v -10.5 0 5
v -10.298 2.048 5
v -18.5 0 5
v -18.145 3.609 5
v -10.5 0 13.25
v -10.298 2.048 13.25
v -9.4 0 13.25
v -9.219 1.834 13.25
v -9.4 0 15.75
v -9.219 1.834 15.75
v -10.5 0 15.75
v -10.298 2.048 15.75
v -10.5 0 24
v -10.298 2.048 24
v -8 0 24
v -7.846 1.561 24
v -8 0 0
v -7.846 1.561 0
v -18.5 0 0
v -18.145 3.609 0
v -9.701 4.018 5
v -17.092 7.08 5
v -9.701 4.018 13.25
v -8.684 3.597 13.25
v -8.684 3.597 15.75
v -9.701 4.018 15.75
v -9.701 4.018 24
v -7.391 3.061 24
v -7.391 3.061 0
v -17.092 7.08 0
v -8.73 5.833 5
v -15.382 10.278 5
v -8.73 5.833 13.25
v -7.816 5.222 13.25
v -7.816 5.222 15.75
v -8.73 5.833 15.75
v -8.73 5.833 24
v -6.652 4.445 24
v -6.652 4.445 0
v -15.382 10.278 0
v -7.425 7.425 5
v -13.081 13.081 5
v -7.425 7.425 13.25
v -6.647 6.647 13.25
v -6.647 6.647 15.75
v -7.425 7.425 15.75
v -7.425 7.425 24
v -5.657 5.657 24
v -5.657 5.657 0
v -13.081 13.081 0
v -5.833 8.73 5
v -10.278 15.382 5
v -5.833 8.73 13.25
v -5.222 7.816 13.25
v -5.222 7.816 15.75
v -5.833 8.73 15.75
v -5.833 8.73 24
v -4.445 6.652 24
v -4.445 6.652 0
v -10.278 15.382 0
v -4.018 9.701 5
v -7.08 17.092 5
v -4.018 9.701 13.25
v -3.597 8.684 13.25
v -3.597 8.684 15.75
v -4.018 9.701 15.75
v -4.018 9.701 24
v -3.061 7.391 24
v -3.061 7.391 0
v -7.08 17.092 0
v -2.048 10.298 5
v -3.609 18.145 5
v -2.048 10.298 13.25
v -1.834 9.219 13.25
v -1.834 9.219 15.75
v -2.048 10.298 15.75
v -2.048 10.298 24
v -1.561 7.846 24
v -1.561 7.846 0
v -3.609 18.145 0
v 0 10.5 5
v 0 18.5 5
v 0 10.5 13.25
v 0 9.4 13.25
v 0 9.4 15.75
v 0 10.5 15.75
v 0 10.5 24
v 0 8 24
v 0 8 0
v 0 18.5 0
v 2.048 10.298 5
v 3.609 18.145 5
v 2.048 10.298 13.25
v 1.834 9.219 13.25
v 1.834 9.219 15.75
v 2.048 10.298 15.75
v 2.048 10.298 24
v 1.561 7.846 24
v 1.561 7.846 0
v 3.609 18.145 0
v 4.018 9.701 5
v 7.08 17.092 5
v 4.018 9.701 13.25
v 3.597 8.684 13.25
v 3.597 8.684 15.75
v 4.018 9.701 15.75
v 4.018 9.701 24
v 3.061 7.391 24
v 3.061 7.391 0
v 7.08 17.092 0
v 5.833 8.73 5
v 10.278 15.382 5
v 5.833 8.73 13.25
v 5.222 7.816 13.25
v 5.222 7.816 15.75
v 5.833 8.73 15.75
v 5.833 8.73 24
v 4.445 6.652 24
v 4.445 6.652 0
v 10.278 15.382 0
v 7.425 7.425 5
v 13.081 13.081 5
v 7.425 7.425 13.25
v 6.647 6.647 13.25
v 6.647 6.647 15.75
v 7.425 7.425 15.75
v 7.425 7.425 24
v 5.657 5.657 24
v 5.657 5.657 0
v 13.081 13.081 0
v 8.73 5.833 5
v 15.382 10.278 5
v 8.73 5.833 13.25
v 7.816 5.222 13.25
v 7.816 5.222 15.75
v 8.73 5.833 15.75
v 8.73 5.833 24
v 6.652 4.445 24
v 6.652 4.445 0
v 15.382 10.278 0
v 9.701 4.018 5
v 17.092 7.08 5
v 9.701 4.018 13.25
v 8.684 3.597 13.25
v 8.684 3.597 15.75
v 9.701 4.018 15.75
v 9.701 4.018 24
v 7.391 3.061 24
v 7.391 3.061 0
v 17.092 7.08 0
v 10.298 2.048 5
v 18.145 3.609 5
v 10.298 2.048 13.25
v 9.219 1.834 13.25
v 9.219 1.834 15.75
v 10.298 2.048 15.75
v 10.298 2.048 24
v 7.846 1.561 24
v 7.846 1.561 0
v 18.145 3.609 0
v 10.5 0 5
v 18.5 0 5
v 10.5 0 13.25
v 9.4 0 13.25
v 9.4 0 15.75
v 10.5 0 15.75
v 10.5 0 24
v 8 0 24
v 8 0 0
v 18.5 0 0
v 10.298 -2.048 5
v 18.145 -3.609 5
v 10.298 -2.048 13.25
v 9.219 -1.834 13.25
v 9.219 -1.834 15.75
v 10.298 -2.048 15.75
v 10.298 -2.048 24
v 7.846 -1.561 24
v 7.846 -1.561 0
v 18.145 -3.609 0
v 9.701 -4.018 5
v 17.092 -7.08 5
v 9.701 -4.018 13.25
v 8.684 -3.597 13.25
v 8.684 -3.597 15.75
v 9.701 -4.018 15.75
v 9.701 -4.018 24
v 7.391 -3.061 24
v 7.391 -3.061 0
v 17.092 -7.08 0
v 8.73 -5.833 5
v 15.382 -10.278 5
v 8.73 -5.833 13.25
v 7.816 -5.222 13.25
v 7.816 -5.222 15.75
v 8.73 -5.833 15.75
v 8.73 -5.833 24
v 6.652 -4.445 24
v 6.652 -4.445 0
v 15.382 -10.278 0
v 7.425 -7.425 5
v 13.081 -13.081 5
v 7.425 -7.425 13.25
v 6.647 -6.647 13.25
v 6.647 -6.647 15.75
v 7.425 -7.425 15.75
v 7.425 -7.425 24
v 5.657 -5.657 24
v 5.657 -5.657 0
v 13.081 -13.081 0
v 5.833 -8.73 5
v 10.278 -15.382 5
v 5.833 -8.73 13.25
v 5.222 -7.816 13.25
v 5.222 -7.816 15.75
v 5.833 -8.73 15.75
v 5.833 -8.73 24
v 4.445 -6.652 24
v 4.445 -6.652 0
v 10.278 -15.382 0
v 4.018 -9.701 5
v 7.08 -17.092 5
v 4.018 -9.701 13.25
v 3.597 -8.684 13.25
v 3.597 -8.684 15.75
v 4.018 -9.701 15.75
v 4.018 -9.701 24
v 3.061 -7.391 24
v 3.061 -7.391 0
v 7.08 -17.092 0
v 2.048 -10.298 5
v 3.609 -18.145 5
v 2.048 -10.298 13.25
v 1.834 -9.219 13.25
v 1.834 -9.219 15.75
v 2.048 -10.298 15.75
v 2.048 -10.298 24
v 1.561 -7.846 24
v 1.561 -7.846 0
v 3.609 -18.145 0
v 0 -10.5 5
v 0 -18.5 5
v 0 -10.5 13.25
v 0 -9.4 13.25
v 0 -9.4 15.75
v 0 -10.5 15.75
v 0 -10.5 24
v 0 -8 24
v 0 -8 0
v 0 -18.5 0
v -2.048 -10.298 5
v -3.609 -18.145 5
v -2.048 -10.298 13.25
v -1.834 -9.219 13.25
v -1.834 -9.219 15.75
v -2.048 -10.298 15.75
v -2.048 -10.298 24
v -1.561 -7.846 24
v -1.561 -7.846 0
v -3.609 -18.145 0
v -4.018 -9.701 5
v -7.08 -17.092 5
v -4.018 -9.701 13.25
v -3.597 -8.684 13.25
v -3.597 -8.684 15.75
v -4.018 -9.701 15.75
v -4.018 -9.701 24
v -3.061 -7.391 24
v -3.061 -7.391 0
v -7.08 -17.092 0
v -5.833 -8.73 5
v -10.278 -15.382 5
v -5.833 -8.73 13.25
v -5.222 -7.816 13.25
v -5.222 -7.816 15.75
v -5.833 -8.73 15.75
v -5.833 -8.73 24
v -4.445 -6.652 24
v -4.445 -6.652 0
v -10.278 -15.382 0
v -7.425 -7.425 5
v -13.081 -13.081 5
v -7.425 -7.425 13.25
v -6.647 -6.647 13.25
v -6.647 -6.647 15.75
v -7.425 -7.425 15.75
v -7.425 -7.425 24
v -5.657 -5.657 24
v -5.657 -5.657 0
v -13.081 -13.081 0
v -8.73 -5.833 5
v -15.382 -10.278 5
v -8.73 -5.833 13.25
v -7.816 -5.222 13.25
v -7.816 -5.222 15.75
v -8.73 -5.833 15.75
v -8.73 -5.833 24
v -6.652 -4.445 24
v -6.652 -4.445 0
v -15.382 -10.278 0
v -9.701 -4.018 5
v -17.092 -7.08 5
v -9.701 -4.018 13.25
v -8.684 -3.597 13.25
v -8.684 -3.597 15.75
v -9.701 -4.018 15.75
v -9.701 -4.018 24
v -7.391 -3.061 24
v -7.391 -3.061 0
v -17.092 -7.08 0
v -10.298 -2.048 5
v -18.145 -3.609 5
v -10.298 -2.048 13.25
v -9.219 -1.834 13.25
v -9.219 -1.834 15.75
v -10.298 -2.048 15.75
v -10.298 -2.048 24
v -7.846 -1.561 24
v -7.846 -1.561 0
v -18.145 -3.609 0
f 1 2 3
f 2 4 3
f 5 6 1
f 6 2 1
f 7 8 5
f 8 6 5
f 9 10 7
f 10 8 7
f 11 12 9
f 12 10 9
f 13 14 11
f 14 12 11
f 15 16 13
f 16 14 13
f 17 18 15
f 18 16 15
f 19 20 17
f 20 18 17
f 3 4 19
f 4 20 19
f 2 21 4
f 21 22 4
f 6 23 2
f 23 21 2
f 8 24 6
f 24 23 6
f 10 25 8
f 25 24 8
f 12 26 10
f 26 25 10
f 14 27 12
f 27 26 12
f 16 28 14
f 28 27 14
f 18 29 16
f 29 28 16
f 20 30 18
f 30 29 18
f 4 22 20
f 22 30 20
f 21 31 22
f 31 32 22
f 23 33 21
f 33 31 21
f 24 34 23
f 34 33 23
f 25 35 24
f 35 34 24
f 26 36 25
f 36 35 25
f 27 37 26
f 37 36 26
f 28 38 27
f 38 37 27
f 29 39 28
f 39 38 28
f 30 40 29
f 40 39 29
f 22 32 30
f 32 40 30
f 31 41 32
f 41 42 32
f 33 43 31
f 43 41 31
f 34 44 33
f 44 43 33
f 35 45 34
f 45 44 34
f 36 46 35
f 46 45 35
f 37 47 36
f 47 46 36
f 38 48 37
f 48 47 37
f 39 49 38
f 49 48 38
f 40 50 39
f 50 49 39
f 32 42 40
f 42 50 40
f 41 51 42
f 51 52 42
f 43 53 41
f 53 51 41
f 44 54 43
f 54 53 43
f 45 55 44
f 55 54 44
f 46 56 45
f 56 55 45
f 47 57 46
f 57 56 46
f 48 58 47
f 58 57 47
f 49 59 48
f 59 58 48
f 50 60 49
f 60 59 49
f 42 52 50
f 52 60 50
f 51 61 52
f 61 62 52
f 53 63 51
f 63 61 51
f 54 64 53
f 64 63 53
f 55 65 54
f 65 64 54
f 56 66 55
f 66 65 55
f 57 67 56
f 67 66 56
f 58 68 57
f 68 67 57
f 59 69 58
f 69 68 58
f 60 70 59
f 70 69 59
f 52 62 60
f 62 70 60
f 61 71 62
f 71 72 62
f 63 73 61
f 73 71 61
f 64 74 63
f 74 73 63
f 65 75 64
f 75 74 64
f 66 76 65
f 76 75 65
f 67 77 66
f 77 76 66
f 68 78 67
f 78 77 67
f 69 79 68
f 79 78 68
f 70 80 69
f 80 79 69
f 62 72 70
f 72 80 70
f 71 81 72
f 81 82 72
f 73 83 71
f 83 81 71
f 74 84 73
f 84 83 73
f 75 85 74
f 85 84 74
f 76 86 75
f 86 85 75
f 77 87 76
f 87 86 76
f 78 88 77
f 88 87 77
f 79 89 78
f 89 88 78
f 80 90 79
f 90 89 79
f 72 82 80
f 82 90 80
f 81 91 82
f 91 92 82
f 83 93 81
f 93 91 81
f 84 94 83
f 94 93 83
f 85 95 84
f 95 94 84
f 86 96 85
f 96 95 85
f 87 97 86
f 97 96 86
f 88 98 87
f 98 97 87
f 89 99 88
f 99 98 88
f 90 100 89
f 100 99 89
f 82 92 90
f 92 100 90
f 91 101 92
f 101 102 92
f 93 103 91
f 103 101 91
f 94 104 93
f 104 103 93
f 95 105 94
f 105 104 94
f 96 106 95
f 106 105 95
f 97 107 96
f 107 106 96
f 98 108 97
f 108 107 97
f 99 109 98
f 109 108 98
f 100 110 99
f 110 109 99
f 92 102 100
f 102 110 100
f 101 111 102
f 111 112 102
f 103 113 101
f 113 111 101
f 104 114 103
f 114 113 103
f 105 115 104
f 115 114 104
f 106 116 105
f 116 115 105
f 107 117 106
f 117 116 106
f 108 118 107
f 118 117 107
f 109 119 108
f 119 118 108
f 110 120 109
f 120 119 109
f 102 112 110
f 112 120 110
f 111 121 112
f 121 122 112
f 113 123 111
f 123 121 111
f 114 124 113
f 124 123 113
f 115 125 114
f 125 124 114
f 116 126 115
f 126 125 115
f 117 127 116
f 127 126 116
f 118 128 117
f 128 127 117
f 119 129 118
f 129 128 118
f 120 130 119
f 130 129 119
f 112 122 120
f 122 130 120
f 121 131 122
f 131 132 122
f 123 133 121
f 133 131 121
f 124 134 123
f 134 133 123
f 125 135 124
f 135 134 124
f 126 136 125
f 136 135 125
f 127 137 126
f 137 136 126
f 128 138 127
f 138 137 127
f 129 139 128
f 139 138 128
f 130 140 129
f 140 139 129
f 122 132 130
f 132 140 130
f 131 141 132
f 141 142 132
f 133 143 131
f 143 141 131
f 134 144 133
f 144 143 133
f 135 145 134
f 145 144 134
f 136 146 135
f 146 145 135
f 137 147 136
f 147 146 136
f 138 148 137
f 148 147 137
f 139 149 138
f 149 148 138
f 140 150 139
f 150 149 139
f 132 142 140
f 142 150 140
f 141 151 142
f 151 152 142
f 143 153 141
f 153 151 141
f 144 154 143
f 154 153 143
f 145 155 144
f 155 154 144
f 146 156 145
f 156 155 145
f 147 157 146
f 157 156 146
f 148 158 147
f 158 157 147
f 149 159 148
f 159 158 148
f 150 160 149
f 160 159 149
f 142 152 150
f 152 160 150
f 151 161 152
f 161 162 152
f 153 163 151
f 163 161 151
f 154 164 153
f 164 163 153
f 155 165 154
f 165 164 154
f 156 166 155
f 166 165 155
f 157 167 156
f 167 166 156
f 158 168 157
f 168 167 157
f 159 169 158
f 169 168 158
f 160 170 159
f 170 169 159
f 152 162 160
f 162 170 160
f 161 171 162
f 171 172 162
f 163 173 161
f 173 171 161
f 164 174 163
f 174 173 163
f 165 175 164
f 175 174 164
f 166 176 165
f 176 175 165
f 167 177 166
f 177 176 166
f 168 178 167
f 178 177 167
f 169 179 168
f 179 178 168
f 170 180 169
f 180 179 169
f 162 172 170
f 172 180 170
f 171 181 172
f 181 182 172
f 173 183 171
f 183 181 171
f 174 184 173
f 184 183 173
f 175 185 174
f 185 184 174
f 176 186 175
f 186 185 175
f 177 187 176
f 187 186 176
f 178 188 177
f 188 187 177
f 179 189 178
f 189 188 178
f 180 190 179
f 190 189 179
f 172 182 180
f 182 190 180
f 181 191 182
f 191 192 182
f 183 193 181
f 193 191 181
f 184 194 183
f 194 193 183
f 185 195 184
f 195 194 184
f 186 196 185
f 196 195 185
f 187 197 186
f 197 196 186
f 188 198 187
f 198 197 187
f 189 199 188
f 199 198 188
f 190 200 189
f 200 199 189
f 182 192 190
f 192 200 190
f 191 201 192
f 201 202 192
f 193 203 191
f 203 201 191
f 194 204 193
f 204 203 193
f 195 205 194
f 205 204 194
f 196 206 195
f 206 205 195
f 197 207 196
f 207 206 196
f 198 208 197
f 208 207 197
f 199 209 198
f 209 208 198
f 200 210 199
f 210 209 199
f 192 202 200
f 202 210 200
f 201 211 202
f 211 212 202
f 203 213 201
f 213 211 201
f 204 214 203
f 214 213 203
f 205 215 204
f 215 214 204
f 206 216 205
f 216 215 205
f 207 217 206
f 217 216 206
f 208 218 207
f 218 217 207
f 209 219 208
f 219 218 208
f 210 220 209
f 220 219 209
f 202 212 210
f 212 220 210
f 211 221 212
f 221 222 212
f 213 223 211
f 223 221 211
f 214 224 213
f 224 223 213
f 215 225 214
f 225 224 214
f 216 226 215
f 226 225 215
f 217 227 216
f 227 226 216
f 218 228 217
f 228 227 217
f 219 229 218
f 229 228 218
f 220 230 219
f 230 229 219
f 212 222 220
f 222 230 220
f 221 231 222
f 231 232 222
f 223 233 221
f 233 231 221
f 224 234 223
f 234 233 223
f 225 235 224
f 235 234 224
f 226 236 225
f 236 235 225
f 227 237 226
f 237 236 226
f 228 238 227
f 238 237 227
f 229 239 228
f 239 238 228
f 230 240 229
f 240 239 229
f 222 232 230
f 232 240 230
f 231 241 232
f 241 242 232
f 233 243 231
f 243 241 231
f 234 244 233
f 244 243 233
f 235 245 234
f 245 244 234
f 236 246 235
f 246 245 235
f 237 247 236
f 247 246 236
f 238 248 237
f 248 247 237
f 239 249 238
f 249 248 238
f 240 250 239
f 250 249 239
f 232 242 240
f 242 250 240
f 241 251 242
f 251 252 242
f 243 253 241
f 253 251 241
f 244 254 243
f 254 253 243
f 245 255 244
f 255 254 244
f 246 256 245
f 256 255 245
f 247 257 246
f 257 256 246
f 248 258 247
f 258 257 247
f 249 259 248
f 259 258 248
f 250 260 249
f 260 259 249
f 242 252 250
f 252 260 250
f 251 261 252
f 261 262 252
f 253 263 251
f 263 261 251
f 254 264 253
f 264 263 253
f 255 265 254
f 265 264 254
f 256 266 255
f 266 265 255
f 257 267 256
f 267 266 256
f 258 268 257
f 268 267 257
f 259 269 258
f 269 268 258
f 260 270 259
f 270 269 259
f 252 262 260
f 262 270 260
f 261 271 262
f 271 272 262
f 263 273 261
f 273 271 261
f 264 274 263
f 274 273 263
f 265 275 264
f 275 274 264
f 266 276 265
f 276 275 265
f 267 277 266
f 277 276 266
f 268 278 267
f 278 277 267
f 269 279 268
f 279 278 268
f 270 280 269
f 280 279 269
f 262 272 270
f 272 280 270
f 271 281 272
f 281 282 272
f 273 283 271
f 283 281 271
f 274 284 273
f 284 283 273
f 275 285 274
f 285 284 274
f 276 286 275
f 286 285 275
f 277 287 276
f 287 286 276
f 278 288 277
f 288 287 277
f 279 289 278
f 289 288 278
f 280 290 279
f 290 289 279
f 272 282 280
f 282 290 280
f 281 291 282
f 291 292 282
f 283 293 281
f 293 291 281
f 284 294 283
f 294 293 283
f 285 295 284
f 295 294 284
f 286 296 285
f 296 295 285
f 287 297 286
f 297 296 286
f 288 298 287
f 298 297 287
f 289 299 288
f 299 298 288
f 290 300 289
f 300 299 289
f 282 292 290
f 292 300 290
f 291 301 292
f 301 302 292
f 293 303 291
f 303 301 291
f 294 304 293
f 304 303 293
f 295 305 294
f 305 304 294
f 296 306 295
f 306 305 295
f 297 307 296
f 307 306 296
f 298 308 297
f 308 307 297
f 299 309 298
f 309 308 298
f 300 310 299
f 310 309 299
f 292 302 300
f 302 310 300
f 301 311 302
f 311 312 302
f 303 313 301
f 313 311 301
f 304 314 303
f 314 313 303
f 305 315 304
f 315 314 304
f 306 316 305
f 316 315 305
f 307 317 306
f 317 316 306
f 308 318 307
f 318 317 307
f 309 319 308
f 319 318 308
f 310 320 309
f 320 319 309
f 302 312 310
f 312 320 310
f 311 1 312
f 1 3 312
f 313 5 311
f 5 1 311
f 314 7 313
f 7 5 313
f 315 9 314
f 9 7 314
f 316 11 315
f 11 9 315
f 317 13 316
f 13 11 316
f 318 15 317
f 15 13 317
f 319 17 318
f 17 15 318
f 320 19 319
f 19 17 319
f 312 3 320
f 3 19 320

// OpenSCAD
$fn = 32;

// ----------------------------------------------------------------------
// Grooved revolve: flanged, bore R8
// ----------------------------------------------------------------------

// --- parameters (mm) ---
bore_r = 8;               // bore radius
outer_r = 10.5;           // outer radius of the body
total_h = 24;             // overall height, Z
wall = 2.5;               // radial wall thickness
groove_w = 2.5;           // groove width
groove_d = 1.1;           // groove depth
grooves = 1;              // number of outer grooves
flange_r = 18.5;          // flange radius
flange_h = 5;             // flange height
fit_tol = 0.02;           // declared fit tolerance (prompt contract)
free_tol = 0.2;           // declared free tolerance (prompt contract)

bbox_x = 2 * flange_r;  // full diameter
bore_d = 2 * bore_r;  // bore diameter
body_d = 2 * outer_r;  // body diameter
flange_d = 2 * flange_r;  // flange diameter
revolve_angle = 360;  // full turn around the Z axis

profile = [[8, 0], [10.5, 0], [18.5, 0], [18.5, 5], [10.5, 5], [10.5, 13.25], [9.4, 13.25], [9.4, 15.75], [10.5, 15.75], [10.5, 24], [8, 24]];  // primary outline, 11 points, counter clockwise

// --- the one profile operation ---
rotate_extrude(angle = revolve_angle) polygon(points = profile);
